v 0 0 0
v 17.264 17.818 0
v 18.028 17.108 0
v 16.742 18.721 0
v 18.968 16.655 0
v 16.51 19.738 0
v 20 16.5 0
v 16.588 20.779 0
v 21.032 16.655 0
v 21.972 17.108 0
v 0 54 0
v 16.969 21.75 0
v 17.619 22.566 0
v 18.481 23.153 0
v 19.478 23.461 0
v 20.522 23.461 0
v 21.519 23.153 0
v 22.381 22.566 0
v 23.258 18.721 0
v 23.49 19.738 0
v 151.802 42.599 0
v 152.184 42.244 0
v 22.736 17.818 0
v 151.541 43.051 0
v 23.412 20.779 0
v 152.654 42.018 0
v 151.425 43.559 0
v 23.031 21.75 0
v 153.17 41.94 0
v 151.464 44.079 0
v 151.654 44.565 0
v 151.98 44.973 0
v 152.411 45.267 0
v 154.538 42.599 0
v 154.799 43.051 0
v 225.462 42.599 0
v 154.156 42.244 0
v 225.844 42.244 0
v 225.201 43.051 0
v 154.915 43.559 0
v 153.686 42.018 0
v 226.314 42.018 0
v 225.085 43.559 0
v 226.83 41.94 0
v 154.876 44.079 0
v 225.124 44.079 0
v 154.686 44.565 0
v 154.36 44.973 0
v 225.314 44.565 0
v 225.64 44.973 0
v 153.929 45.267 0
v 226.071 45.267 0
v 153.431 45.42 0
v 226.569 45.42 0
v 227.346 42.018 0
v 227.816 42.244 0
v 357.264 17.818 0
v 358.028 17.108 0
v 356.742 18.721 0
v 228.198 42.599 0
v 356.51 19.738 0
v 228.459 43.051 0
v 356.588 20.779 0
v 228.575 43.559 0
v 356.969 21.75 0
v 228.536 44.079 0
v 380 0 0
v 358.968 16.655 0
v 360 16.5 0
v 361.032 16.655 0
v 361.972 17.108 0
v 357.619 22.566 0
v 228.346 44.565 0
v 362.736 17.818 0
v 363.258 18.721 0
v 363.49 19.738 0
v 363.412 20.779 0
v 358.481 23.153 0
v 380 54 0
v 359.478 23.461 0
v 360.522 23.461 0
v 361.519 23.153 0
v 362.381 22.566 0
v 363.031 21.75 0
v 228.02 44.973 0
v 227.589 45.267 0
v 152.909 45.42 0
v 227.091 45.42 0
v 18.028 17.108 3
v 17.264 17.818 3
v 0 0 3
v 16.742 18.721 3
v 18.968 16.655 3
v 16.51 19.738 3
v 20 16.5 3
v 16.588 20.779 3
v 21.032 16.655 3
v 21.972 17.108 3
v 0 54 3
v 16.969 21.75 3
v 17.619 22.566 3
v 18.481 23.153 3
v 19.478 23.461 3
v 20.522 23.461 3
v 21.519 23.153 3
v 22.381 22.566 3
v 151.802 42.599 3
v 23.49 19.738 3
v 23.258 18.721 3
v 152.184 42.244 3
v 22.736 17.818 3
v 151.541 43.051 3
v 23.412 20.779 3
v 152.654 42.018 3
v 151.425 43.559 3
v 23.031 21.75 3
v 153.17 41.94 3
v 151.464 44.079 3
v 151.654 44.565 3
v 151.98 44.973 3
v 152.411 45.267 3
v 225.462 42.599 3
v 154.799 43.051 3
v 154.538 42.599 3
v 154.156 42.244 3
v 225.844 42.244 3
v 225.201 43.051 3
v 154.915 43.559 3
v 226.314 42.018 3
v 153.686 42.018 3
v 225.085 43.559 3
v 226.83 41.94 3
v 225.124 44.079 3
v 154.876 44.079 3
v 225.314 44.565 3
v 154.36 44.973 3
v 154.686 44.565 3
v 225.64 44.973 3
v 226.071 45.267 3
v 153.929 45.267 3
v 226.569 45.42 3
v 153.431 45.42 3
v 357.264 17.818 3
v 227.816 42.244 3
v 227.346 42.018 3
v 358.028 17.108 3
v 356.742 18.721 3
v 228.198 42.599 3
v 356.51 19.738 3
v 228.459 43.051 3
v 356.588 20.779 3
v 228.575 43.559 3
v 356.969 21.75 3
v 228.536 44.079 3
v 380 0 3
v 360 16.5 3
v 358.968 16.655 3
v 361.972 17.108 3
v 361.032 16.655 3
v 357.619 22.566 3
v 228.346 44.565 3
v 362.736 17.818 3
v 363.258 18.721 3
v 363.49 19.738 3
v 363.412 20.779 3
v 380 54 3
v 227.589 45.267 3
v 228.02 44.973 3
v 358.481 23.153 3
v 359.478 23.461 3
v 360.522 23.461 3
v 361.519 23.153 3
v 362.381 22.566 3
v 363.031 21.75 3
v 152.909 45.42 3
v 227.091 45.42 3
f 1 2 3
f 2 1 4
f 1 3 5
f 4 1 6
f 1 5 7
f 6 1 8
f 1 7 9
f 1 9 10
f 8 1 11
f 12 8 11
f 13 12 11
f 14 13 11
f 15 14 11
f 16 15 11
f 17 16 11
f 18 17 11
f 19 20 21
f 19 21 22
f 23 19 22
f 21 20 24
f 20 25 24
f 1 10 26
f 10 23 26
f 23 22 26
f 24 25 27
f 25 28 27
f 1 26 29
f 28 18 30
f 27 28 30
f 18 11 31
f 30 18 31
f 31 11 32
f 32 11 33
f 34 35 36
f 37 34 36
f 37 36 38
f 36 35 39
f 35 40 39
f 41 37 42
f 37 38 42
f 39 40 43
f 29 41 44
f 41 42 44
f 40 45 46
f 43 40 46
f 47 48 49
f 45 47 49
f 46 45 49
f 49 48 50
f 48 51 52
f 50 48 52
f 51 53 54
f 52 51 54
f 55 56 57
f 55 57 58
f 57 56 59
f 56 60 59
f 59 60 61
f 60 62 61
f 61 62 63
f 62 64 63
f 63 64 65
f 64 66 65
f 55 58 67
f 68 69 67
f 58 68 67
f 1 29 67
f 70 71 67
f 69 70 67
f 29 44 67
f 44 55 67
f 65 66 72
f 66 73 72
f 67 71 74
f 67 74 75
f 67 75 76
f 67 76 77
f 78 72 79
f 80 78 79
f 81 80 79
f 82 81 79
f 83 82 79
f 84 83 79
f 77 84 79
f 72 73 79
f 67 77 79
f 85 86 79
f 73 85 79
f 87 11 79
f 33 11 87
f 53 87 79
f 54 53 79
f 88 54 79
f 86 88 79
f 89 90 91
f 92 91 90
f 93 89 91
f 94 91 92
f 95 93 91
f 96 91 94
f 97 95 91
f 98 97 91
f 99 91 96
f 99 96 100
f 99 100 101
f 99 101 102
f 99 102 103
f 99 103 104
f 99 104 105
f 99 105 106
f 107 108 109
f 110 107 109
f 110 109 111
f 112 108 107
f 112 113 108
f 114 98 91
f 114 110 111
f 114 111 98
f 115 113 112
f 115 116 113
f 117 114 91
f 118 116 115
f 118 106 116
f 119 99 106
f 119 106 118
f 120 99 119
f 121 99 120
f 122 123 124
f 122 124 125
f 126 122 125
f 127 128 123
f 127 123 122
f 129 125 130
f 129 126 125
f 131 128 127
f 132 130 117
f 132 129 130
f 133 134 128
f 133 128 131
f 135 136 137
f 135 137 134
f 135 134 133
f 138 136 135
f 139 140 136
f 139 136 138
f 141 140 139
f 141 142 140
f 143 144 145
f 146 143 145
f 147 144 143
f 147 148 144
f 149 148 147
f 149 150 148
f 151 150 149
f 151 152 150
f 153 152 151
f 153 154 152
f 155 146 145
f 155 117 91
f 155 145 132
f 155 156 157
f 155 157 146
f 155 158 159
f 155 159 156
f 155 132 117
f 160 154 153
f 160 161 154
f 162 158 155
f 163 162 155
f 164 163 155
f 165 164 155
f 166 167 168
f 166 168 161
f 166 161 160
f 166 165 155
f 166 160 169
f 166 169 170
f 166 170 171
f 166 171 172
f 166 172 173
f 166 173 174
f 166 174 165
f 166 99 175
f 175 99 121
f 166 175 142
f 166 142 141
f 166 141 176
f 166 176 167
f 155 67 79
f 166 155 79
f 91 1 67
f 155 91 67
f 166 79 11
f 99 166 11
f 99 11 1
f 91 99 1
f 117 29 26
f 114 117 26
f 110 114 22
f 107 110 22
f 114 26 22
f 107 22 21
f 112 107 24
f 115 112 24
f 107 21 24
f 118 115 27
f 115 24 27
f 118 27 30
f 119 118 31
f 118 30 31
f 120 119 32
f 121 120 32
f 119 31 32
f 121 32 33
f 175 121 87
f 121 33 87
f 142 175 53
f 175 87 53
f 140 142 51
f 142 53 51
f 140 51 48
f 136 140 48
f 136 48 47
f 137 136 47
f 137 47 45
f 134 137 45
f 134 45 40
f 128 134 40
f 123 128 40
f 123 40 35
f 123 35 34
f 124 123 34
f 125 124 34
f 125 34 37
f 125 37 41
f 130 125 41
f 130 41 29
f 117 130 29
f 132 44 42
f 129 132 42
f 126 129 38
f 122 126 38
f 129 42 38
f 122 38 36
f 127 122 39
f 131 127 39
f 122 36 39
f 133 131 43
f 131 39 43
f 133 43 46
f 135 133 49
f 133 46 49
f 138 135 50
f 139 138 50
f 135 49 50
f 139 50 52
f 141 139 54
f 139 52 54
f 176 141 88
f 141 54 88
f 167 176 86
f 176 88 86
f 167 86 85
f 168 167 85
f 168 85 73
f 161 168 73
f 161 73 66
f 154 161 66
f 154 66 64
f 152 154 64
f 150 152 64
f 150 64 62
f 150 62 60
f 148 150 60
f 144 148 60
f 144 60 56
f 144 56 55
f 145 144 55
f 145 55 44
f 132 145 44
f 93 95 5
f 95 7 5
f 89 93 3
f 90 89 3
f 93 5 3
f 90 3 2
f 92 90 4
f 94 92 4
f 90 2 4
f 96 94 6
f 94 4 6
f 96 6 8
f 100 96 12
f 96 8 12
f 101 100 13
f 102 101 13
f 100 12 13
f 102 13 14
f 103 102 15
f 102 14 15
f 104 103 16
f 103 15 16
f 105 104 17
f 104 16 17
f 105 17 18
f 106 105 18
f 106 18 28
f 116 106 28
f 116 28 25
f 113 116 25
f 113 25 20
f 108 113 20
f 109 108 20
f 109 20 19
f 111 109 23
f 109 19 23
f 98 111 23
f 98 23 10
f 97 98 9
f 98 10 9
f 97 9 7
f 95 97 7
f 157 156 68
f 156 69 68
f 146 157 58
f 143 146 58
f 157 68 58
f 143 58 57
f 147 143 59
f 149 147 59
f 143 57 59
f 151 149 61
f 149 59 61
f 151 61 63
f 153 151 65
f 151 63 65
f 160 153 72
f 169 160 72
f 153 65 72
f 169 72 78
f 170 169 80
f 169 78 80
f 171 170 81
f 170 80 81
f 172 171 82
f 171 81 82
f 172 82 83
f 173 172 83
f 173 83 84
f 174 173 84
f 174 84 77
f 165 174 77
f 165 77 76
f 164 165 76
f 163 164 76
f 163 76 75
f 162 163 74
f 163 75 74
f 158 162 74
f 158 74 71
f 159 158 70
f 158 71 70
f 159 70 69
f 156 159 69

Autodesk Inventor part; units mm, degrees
ref_plane "YZ Plane" through (0, 0, 0) normal (1, 0, 0) x (0, 1, 0)
ref_plane "XZ Plane" through (0, 0, 0) normal (0, 1, 0) x (-1, 0, 0)
ref_plane "XY Plane" through (0, 0, 0) normal (0, 0, 1) x (1, 0, 0)
sketch "Sketch1" plane through (0, 0, 0) normal (0, 0, 1) x (1, 0, 0)
  line L0 (0, 0) -> (380, 0)
  line L1 (380, 0) -> (380, 54)
  line L2 (380, 54) -> (0, 54)
  line L3 (0, 54) -> (0, 0)
  dimension "d0" = 380
  dimension "d1" = 54
extrude "Extrusion1" add sketch "Sketch1" along normal blind 3
sketch "Sketch2" plane through (0, 0, 3) normal (0, 0, 1) x (1, 0, 0)
  line L0 (0, 54) -> (0, 0) projected
  line L1 (380, 54) -> (0, 54) projected
  line L2 (0, 0) -> (380, 0) projected
  line L3 (380, 0) -> (380, 54) projected
  point P0 (20, 20)
  point P1 (360, 20)
  dimension "d4" = 20
  dimension "d6" = 20
  dimension "d7" = 20
  dimension "d8" = 20
hole "Hole1" at (20, 20, 3) at (360, 20, 3) direction (0, 0, -1) diameter 7 end through all
sketch "Sketch3" plane through (0, 0, 3) normal (0, 0, 1) x (1, 0, 0)
  line L0 (0, 54) -> (0, 0) projected
  line L1 (380, 54) -> (0, 54) projected
  point P0 (153.17, 43.69)
  point P1 (226.83, 43.69)
  dimension "d16" = 73.66
  dimension "d17" = 153.17
  dimension "d18" = 10.31
  dimension "d19" = 10.31
hole "Hole2" at (153.17, 43.69, 3) at (226.83, 43.69, 3) direction (0, 0, -1) diameter 3.5 end through all
properties part number "SupportsheetMonitor" material "Aluminum 6061"
